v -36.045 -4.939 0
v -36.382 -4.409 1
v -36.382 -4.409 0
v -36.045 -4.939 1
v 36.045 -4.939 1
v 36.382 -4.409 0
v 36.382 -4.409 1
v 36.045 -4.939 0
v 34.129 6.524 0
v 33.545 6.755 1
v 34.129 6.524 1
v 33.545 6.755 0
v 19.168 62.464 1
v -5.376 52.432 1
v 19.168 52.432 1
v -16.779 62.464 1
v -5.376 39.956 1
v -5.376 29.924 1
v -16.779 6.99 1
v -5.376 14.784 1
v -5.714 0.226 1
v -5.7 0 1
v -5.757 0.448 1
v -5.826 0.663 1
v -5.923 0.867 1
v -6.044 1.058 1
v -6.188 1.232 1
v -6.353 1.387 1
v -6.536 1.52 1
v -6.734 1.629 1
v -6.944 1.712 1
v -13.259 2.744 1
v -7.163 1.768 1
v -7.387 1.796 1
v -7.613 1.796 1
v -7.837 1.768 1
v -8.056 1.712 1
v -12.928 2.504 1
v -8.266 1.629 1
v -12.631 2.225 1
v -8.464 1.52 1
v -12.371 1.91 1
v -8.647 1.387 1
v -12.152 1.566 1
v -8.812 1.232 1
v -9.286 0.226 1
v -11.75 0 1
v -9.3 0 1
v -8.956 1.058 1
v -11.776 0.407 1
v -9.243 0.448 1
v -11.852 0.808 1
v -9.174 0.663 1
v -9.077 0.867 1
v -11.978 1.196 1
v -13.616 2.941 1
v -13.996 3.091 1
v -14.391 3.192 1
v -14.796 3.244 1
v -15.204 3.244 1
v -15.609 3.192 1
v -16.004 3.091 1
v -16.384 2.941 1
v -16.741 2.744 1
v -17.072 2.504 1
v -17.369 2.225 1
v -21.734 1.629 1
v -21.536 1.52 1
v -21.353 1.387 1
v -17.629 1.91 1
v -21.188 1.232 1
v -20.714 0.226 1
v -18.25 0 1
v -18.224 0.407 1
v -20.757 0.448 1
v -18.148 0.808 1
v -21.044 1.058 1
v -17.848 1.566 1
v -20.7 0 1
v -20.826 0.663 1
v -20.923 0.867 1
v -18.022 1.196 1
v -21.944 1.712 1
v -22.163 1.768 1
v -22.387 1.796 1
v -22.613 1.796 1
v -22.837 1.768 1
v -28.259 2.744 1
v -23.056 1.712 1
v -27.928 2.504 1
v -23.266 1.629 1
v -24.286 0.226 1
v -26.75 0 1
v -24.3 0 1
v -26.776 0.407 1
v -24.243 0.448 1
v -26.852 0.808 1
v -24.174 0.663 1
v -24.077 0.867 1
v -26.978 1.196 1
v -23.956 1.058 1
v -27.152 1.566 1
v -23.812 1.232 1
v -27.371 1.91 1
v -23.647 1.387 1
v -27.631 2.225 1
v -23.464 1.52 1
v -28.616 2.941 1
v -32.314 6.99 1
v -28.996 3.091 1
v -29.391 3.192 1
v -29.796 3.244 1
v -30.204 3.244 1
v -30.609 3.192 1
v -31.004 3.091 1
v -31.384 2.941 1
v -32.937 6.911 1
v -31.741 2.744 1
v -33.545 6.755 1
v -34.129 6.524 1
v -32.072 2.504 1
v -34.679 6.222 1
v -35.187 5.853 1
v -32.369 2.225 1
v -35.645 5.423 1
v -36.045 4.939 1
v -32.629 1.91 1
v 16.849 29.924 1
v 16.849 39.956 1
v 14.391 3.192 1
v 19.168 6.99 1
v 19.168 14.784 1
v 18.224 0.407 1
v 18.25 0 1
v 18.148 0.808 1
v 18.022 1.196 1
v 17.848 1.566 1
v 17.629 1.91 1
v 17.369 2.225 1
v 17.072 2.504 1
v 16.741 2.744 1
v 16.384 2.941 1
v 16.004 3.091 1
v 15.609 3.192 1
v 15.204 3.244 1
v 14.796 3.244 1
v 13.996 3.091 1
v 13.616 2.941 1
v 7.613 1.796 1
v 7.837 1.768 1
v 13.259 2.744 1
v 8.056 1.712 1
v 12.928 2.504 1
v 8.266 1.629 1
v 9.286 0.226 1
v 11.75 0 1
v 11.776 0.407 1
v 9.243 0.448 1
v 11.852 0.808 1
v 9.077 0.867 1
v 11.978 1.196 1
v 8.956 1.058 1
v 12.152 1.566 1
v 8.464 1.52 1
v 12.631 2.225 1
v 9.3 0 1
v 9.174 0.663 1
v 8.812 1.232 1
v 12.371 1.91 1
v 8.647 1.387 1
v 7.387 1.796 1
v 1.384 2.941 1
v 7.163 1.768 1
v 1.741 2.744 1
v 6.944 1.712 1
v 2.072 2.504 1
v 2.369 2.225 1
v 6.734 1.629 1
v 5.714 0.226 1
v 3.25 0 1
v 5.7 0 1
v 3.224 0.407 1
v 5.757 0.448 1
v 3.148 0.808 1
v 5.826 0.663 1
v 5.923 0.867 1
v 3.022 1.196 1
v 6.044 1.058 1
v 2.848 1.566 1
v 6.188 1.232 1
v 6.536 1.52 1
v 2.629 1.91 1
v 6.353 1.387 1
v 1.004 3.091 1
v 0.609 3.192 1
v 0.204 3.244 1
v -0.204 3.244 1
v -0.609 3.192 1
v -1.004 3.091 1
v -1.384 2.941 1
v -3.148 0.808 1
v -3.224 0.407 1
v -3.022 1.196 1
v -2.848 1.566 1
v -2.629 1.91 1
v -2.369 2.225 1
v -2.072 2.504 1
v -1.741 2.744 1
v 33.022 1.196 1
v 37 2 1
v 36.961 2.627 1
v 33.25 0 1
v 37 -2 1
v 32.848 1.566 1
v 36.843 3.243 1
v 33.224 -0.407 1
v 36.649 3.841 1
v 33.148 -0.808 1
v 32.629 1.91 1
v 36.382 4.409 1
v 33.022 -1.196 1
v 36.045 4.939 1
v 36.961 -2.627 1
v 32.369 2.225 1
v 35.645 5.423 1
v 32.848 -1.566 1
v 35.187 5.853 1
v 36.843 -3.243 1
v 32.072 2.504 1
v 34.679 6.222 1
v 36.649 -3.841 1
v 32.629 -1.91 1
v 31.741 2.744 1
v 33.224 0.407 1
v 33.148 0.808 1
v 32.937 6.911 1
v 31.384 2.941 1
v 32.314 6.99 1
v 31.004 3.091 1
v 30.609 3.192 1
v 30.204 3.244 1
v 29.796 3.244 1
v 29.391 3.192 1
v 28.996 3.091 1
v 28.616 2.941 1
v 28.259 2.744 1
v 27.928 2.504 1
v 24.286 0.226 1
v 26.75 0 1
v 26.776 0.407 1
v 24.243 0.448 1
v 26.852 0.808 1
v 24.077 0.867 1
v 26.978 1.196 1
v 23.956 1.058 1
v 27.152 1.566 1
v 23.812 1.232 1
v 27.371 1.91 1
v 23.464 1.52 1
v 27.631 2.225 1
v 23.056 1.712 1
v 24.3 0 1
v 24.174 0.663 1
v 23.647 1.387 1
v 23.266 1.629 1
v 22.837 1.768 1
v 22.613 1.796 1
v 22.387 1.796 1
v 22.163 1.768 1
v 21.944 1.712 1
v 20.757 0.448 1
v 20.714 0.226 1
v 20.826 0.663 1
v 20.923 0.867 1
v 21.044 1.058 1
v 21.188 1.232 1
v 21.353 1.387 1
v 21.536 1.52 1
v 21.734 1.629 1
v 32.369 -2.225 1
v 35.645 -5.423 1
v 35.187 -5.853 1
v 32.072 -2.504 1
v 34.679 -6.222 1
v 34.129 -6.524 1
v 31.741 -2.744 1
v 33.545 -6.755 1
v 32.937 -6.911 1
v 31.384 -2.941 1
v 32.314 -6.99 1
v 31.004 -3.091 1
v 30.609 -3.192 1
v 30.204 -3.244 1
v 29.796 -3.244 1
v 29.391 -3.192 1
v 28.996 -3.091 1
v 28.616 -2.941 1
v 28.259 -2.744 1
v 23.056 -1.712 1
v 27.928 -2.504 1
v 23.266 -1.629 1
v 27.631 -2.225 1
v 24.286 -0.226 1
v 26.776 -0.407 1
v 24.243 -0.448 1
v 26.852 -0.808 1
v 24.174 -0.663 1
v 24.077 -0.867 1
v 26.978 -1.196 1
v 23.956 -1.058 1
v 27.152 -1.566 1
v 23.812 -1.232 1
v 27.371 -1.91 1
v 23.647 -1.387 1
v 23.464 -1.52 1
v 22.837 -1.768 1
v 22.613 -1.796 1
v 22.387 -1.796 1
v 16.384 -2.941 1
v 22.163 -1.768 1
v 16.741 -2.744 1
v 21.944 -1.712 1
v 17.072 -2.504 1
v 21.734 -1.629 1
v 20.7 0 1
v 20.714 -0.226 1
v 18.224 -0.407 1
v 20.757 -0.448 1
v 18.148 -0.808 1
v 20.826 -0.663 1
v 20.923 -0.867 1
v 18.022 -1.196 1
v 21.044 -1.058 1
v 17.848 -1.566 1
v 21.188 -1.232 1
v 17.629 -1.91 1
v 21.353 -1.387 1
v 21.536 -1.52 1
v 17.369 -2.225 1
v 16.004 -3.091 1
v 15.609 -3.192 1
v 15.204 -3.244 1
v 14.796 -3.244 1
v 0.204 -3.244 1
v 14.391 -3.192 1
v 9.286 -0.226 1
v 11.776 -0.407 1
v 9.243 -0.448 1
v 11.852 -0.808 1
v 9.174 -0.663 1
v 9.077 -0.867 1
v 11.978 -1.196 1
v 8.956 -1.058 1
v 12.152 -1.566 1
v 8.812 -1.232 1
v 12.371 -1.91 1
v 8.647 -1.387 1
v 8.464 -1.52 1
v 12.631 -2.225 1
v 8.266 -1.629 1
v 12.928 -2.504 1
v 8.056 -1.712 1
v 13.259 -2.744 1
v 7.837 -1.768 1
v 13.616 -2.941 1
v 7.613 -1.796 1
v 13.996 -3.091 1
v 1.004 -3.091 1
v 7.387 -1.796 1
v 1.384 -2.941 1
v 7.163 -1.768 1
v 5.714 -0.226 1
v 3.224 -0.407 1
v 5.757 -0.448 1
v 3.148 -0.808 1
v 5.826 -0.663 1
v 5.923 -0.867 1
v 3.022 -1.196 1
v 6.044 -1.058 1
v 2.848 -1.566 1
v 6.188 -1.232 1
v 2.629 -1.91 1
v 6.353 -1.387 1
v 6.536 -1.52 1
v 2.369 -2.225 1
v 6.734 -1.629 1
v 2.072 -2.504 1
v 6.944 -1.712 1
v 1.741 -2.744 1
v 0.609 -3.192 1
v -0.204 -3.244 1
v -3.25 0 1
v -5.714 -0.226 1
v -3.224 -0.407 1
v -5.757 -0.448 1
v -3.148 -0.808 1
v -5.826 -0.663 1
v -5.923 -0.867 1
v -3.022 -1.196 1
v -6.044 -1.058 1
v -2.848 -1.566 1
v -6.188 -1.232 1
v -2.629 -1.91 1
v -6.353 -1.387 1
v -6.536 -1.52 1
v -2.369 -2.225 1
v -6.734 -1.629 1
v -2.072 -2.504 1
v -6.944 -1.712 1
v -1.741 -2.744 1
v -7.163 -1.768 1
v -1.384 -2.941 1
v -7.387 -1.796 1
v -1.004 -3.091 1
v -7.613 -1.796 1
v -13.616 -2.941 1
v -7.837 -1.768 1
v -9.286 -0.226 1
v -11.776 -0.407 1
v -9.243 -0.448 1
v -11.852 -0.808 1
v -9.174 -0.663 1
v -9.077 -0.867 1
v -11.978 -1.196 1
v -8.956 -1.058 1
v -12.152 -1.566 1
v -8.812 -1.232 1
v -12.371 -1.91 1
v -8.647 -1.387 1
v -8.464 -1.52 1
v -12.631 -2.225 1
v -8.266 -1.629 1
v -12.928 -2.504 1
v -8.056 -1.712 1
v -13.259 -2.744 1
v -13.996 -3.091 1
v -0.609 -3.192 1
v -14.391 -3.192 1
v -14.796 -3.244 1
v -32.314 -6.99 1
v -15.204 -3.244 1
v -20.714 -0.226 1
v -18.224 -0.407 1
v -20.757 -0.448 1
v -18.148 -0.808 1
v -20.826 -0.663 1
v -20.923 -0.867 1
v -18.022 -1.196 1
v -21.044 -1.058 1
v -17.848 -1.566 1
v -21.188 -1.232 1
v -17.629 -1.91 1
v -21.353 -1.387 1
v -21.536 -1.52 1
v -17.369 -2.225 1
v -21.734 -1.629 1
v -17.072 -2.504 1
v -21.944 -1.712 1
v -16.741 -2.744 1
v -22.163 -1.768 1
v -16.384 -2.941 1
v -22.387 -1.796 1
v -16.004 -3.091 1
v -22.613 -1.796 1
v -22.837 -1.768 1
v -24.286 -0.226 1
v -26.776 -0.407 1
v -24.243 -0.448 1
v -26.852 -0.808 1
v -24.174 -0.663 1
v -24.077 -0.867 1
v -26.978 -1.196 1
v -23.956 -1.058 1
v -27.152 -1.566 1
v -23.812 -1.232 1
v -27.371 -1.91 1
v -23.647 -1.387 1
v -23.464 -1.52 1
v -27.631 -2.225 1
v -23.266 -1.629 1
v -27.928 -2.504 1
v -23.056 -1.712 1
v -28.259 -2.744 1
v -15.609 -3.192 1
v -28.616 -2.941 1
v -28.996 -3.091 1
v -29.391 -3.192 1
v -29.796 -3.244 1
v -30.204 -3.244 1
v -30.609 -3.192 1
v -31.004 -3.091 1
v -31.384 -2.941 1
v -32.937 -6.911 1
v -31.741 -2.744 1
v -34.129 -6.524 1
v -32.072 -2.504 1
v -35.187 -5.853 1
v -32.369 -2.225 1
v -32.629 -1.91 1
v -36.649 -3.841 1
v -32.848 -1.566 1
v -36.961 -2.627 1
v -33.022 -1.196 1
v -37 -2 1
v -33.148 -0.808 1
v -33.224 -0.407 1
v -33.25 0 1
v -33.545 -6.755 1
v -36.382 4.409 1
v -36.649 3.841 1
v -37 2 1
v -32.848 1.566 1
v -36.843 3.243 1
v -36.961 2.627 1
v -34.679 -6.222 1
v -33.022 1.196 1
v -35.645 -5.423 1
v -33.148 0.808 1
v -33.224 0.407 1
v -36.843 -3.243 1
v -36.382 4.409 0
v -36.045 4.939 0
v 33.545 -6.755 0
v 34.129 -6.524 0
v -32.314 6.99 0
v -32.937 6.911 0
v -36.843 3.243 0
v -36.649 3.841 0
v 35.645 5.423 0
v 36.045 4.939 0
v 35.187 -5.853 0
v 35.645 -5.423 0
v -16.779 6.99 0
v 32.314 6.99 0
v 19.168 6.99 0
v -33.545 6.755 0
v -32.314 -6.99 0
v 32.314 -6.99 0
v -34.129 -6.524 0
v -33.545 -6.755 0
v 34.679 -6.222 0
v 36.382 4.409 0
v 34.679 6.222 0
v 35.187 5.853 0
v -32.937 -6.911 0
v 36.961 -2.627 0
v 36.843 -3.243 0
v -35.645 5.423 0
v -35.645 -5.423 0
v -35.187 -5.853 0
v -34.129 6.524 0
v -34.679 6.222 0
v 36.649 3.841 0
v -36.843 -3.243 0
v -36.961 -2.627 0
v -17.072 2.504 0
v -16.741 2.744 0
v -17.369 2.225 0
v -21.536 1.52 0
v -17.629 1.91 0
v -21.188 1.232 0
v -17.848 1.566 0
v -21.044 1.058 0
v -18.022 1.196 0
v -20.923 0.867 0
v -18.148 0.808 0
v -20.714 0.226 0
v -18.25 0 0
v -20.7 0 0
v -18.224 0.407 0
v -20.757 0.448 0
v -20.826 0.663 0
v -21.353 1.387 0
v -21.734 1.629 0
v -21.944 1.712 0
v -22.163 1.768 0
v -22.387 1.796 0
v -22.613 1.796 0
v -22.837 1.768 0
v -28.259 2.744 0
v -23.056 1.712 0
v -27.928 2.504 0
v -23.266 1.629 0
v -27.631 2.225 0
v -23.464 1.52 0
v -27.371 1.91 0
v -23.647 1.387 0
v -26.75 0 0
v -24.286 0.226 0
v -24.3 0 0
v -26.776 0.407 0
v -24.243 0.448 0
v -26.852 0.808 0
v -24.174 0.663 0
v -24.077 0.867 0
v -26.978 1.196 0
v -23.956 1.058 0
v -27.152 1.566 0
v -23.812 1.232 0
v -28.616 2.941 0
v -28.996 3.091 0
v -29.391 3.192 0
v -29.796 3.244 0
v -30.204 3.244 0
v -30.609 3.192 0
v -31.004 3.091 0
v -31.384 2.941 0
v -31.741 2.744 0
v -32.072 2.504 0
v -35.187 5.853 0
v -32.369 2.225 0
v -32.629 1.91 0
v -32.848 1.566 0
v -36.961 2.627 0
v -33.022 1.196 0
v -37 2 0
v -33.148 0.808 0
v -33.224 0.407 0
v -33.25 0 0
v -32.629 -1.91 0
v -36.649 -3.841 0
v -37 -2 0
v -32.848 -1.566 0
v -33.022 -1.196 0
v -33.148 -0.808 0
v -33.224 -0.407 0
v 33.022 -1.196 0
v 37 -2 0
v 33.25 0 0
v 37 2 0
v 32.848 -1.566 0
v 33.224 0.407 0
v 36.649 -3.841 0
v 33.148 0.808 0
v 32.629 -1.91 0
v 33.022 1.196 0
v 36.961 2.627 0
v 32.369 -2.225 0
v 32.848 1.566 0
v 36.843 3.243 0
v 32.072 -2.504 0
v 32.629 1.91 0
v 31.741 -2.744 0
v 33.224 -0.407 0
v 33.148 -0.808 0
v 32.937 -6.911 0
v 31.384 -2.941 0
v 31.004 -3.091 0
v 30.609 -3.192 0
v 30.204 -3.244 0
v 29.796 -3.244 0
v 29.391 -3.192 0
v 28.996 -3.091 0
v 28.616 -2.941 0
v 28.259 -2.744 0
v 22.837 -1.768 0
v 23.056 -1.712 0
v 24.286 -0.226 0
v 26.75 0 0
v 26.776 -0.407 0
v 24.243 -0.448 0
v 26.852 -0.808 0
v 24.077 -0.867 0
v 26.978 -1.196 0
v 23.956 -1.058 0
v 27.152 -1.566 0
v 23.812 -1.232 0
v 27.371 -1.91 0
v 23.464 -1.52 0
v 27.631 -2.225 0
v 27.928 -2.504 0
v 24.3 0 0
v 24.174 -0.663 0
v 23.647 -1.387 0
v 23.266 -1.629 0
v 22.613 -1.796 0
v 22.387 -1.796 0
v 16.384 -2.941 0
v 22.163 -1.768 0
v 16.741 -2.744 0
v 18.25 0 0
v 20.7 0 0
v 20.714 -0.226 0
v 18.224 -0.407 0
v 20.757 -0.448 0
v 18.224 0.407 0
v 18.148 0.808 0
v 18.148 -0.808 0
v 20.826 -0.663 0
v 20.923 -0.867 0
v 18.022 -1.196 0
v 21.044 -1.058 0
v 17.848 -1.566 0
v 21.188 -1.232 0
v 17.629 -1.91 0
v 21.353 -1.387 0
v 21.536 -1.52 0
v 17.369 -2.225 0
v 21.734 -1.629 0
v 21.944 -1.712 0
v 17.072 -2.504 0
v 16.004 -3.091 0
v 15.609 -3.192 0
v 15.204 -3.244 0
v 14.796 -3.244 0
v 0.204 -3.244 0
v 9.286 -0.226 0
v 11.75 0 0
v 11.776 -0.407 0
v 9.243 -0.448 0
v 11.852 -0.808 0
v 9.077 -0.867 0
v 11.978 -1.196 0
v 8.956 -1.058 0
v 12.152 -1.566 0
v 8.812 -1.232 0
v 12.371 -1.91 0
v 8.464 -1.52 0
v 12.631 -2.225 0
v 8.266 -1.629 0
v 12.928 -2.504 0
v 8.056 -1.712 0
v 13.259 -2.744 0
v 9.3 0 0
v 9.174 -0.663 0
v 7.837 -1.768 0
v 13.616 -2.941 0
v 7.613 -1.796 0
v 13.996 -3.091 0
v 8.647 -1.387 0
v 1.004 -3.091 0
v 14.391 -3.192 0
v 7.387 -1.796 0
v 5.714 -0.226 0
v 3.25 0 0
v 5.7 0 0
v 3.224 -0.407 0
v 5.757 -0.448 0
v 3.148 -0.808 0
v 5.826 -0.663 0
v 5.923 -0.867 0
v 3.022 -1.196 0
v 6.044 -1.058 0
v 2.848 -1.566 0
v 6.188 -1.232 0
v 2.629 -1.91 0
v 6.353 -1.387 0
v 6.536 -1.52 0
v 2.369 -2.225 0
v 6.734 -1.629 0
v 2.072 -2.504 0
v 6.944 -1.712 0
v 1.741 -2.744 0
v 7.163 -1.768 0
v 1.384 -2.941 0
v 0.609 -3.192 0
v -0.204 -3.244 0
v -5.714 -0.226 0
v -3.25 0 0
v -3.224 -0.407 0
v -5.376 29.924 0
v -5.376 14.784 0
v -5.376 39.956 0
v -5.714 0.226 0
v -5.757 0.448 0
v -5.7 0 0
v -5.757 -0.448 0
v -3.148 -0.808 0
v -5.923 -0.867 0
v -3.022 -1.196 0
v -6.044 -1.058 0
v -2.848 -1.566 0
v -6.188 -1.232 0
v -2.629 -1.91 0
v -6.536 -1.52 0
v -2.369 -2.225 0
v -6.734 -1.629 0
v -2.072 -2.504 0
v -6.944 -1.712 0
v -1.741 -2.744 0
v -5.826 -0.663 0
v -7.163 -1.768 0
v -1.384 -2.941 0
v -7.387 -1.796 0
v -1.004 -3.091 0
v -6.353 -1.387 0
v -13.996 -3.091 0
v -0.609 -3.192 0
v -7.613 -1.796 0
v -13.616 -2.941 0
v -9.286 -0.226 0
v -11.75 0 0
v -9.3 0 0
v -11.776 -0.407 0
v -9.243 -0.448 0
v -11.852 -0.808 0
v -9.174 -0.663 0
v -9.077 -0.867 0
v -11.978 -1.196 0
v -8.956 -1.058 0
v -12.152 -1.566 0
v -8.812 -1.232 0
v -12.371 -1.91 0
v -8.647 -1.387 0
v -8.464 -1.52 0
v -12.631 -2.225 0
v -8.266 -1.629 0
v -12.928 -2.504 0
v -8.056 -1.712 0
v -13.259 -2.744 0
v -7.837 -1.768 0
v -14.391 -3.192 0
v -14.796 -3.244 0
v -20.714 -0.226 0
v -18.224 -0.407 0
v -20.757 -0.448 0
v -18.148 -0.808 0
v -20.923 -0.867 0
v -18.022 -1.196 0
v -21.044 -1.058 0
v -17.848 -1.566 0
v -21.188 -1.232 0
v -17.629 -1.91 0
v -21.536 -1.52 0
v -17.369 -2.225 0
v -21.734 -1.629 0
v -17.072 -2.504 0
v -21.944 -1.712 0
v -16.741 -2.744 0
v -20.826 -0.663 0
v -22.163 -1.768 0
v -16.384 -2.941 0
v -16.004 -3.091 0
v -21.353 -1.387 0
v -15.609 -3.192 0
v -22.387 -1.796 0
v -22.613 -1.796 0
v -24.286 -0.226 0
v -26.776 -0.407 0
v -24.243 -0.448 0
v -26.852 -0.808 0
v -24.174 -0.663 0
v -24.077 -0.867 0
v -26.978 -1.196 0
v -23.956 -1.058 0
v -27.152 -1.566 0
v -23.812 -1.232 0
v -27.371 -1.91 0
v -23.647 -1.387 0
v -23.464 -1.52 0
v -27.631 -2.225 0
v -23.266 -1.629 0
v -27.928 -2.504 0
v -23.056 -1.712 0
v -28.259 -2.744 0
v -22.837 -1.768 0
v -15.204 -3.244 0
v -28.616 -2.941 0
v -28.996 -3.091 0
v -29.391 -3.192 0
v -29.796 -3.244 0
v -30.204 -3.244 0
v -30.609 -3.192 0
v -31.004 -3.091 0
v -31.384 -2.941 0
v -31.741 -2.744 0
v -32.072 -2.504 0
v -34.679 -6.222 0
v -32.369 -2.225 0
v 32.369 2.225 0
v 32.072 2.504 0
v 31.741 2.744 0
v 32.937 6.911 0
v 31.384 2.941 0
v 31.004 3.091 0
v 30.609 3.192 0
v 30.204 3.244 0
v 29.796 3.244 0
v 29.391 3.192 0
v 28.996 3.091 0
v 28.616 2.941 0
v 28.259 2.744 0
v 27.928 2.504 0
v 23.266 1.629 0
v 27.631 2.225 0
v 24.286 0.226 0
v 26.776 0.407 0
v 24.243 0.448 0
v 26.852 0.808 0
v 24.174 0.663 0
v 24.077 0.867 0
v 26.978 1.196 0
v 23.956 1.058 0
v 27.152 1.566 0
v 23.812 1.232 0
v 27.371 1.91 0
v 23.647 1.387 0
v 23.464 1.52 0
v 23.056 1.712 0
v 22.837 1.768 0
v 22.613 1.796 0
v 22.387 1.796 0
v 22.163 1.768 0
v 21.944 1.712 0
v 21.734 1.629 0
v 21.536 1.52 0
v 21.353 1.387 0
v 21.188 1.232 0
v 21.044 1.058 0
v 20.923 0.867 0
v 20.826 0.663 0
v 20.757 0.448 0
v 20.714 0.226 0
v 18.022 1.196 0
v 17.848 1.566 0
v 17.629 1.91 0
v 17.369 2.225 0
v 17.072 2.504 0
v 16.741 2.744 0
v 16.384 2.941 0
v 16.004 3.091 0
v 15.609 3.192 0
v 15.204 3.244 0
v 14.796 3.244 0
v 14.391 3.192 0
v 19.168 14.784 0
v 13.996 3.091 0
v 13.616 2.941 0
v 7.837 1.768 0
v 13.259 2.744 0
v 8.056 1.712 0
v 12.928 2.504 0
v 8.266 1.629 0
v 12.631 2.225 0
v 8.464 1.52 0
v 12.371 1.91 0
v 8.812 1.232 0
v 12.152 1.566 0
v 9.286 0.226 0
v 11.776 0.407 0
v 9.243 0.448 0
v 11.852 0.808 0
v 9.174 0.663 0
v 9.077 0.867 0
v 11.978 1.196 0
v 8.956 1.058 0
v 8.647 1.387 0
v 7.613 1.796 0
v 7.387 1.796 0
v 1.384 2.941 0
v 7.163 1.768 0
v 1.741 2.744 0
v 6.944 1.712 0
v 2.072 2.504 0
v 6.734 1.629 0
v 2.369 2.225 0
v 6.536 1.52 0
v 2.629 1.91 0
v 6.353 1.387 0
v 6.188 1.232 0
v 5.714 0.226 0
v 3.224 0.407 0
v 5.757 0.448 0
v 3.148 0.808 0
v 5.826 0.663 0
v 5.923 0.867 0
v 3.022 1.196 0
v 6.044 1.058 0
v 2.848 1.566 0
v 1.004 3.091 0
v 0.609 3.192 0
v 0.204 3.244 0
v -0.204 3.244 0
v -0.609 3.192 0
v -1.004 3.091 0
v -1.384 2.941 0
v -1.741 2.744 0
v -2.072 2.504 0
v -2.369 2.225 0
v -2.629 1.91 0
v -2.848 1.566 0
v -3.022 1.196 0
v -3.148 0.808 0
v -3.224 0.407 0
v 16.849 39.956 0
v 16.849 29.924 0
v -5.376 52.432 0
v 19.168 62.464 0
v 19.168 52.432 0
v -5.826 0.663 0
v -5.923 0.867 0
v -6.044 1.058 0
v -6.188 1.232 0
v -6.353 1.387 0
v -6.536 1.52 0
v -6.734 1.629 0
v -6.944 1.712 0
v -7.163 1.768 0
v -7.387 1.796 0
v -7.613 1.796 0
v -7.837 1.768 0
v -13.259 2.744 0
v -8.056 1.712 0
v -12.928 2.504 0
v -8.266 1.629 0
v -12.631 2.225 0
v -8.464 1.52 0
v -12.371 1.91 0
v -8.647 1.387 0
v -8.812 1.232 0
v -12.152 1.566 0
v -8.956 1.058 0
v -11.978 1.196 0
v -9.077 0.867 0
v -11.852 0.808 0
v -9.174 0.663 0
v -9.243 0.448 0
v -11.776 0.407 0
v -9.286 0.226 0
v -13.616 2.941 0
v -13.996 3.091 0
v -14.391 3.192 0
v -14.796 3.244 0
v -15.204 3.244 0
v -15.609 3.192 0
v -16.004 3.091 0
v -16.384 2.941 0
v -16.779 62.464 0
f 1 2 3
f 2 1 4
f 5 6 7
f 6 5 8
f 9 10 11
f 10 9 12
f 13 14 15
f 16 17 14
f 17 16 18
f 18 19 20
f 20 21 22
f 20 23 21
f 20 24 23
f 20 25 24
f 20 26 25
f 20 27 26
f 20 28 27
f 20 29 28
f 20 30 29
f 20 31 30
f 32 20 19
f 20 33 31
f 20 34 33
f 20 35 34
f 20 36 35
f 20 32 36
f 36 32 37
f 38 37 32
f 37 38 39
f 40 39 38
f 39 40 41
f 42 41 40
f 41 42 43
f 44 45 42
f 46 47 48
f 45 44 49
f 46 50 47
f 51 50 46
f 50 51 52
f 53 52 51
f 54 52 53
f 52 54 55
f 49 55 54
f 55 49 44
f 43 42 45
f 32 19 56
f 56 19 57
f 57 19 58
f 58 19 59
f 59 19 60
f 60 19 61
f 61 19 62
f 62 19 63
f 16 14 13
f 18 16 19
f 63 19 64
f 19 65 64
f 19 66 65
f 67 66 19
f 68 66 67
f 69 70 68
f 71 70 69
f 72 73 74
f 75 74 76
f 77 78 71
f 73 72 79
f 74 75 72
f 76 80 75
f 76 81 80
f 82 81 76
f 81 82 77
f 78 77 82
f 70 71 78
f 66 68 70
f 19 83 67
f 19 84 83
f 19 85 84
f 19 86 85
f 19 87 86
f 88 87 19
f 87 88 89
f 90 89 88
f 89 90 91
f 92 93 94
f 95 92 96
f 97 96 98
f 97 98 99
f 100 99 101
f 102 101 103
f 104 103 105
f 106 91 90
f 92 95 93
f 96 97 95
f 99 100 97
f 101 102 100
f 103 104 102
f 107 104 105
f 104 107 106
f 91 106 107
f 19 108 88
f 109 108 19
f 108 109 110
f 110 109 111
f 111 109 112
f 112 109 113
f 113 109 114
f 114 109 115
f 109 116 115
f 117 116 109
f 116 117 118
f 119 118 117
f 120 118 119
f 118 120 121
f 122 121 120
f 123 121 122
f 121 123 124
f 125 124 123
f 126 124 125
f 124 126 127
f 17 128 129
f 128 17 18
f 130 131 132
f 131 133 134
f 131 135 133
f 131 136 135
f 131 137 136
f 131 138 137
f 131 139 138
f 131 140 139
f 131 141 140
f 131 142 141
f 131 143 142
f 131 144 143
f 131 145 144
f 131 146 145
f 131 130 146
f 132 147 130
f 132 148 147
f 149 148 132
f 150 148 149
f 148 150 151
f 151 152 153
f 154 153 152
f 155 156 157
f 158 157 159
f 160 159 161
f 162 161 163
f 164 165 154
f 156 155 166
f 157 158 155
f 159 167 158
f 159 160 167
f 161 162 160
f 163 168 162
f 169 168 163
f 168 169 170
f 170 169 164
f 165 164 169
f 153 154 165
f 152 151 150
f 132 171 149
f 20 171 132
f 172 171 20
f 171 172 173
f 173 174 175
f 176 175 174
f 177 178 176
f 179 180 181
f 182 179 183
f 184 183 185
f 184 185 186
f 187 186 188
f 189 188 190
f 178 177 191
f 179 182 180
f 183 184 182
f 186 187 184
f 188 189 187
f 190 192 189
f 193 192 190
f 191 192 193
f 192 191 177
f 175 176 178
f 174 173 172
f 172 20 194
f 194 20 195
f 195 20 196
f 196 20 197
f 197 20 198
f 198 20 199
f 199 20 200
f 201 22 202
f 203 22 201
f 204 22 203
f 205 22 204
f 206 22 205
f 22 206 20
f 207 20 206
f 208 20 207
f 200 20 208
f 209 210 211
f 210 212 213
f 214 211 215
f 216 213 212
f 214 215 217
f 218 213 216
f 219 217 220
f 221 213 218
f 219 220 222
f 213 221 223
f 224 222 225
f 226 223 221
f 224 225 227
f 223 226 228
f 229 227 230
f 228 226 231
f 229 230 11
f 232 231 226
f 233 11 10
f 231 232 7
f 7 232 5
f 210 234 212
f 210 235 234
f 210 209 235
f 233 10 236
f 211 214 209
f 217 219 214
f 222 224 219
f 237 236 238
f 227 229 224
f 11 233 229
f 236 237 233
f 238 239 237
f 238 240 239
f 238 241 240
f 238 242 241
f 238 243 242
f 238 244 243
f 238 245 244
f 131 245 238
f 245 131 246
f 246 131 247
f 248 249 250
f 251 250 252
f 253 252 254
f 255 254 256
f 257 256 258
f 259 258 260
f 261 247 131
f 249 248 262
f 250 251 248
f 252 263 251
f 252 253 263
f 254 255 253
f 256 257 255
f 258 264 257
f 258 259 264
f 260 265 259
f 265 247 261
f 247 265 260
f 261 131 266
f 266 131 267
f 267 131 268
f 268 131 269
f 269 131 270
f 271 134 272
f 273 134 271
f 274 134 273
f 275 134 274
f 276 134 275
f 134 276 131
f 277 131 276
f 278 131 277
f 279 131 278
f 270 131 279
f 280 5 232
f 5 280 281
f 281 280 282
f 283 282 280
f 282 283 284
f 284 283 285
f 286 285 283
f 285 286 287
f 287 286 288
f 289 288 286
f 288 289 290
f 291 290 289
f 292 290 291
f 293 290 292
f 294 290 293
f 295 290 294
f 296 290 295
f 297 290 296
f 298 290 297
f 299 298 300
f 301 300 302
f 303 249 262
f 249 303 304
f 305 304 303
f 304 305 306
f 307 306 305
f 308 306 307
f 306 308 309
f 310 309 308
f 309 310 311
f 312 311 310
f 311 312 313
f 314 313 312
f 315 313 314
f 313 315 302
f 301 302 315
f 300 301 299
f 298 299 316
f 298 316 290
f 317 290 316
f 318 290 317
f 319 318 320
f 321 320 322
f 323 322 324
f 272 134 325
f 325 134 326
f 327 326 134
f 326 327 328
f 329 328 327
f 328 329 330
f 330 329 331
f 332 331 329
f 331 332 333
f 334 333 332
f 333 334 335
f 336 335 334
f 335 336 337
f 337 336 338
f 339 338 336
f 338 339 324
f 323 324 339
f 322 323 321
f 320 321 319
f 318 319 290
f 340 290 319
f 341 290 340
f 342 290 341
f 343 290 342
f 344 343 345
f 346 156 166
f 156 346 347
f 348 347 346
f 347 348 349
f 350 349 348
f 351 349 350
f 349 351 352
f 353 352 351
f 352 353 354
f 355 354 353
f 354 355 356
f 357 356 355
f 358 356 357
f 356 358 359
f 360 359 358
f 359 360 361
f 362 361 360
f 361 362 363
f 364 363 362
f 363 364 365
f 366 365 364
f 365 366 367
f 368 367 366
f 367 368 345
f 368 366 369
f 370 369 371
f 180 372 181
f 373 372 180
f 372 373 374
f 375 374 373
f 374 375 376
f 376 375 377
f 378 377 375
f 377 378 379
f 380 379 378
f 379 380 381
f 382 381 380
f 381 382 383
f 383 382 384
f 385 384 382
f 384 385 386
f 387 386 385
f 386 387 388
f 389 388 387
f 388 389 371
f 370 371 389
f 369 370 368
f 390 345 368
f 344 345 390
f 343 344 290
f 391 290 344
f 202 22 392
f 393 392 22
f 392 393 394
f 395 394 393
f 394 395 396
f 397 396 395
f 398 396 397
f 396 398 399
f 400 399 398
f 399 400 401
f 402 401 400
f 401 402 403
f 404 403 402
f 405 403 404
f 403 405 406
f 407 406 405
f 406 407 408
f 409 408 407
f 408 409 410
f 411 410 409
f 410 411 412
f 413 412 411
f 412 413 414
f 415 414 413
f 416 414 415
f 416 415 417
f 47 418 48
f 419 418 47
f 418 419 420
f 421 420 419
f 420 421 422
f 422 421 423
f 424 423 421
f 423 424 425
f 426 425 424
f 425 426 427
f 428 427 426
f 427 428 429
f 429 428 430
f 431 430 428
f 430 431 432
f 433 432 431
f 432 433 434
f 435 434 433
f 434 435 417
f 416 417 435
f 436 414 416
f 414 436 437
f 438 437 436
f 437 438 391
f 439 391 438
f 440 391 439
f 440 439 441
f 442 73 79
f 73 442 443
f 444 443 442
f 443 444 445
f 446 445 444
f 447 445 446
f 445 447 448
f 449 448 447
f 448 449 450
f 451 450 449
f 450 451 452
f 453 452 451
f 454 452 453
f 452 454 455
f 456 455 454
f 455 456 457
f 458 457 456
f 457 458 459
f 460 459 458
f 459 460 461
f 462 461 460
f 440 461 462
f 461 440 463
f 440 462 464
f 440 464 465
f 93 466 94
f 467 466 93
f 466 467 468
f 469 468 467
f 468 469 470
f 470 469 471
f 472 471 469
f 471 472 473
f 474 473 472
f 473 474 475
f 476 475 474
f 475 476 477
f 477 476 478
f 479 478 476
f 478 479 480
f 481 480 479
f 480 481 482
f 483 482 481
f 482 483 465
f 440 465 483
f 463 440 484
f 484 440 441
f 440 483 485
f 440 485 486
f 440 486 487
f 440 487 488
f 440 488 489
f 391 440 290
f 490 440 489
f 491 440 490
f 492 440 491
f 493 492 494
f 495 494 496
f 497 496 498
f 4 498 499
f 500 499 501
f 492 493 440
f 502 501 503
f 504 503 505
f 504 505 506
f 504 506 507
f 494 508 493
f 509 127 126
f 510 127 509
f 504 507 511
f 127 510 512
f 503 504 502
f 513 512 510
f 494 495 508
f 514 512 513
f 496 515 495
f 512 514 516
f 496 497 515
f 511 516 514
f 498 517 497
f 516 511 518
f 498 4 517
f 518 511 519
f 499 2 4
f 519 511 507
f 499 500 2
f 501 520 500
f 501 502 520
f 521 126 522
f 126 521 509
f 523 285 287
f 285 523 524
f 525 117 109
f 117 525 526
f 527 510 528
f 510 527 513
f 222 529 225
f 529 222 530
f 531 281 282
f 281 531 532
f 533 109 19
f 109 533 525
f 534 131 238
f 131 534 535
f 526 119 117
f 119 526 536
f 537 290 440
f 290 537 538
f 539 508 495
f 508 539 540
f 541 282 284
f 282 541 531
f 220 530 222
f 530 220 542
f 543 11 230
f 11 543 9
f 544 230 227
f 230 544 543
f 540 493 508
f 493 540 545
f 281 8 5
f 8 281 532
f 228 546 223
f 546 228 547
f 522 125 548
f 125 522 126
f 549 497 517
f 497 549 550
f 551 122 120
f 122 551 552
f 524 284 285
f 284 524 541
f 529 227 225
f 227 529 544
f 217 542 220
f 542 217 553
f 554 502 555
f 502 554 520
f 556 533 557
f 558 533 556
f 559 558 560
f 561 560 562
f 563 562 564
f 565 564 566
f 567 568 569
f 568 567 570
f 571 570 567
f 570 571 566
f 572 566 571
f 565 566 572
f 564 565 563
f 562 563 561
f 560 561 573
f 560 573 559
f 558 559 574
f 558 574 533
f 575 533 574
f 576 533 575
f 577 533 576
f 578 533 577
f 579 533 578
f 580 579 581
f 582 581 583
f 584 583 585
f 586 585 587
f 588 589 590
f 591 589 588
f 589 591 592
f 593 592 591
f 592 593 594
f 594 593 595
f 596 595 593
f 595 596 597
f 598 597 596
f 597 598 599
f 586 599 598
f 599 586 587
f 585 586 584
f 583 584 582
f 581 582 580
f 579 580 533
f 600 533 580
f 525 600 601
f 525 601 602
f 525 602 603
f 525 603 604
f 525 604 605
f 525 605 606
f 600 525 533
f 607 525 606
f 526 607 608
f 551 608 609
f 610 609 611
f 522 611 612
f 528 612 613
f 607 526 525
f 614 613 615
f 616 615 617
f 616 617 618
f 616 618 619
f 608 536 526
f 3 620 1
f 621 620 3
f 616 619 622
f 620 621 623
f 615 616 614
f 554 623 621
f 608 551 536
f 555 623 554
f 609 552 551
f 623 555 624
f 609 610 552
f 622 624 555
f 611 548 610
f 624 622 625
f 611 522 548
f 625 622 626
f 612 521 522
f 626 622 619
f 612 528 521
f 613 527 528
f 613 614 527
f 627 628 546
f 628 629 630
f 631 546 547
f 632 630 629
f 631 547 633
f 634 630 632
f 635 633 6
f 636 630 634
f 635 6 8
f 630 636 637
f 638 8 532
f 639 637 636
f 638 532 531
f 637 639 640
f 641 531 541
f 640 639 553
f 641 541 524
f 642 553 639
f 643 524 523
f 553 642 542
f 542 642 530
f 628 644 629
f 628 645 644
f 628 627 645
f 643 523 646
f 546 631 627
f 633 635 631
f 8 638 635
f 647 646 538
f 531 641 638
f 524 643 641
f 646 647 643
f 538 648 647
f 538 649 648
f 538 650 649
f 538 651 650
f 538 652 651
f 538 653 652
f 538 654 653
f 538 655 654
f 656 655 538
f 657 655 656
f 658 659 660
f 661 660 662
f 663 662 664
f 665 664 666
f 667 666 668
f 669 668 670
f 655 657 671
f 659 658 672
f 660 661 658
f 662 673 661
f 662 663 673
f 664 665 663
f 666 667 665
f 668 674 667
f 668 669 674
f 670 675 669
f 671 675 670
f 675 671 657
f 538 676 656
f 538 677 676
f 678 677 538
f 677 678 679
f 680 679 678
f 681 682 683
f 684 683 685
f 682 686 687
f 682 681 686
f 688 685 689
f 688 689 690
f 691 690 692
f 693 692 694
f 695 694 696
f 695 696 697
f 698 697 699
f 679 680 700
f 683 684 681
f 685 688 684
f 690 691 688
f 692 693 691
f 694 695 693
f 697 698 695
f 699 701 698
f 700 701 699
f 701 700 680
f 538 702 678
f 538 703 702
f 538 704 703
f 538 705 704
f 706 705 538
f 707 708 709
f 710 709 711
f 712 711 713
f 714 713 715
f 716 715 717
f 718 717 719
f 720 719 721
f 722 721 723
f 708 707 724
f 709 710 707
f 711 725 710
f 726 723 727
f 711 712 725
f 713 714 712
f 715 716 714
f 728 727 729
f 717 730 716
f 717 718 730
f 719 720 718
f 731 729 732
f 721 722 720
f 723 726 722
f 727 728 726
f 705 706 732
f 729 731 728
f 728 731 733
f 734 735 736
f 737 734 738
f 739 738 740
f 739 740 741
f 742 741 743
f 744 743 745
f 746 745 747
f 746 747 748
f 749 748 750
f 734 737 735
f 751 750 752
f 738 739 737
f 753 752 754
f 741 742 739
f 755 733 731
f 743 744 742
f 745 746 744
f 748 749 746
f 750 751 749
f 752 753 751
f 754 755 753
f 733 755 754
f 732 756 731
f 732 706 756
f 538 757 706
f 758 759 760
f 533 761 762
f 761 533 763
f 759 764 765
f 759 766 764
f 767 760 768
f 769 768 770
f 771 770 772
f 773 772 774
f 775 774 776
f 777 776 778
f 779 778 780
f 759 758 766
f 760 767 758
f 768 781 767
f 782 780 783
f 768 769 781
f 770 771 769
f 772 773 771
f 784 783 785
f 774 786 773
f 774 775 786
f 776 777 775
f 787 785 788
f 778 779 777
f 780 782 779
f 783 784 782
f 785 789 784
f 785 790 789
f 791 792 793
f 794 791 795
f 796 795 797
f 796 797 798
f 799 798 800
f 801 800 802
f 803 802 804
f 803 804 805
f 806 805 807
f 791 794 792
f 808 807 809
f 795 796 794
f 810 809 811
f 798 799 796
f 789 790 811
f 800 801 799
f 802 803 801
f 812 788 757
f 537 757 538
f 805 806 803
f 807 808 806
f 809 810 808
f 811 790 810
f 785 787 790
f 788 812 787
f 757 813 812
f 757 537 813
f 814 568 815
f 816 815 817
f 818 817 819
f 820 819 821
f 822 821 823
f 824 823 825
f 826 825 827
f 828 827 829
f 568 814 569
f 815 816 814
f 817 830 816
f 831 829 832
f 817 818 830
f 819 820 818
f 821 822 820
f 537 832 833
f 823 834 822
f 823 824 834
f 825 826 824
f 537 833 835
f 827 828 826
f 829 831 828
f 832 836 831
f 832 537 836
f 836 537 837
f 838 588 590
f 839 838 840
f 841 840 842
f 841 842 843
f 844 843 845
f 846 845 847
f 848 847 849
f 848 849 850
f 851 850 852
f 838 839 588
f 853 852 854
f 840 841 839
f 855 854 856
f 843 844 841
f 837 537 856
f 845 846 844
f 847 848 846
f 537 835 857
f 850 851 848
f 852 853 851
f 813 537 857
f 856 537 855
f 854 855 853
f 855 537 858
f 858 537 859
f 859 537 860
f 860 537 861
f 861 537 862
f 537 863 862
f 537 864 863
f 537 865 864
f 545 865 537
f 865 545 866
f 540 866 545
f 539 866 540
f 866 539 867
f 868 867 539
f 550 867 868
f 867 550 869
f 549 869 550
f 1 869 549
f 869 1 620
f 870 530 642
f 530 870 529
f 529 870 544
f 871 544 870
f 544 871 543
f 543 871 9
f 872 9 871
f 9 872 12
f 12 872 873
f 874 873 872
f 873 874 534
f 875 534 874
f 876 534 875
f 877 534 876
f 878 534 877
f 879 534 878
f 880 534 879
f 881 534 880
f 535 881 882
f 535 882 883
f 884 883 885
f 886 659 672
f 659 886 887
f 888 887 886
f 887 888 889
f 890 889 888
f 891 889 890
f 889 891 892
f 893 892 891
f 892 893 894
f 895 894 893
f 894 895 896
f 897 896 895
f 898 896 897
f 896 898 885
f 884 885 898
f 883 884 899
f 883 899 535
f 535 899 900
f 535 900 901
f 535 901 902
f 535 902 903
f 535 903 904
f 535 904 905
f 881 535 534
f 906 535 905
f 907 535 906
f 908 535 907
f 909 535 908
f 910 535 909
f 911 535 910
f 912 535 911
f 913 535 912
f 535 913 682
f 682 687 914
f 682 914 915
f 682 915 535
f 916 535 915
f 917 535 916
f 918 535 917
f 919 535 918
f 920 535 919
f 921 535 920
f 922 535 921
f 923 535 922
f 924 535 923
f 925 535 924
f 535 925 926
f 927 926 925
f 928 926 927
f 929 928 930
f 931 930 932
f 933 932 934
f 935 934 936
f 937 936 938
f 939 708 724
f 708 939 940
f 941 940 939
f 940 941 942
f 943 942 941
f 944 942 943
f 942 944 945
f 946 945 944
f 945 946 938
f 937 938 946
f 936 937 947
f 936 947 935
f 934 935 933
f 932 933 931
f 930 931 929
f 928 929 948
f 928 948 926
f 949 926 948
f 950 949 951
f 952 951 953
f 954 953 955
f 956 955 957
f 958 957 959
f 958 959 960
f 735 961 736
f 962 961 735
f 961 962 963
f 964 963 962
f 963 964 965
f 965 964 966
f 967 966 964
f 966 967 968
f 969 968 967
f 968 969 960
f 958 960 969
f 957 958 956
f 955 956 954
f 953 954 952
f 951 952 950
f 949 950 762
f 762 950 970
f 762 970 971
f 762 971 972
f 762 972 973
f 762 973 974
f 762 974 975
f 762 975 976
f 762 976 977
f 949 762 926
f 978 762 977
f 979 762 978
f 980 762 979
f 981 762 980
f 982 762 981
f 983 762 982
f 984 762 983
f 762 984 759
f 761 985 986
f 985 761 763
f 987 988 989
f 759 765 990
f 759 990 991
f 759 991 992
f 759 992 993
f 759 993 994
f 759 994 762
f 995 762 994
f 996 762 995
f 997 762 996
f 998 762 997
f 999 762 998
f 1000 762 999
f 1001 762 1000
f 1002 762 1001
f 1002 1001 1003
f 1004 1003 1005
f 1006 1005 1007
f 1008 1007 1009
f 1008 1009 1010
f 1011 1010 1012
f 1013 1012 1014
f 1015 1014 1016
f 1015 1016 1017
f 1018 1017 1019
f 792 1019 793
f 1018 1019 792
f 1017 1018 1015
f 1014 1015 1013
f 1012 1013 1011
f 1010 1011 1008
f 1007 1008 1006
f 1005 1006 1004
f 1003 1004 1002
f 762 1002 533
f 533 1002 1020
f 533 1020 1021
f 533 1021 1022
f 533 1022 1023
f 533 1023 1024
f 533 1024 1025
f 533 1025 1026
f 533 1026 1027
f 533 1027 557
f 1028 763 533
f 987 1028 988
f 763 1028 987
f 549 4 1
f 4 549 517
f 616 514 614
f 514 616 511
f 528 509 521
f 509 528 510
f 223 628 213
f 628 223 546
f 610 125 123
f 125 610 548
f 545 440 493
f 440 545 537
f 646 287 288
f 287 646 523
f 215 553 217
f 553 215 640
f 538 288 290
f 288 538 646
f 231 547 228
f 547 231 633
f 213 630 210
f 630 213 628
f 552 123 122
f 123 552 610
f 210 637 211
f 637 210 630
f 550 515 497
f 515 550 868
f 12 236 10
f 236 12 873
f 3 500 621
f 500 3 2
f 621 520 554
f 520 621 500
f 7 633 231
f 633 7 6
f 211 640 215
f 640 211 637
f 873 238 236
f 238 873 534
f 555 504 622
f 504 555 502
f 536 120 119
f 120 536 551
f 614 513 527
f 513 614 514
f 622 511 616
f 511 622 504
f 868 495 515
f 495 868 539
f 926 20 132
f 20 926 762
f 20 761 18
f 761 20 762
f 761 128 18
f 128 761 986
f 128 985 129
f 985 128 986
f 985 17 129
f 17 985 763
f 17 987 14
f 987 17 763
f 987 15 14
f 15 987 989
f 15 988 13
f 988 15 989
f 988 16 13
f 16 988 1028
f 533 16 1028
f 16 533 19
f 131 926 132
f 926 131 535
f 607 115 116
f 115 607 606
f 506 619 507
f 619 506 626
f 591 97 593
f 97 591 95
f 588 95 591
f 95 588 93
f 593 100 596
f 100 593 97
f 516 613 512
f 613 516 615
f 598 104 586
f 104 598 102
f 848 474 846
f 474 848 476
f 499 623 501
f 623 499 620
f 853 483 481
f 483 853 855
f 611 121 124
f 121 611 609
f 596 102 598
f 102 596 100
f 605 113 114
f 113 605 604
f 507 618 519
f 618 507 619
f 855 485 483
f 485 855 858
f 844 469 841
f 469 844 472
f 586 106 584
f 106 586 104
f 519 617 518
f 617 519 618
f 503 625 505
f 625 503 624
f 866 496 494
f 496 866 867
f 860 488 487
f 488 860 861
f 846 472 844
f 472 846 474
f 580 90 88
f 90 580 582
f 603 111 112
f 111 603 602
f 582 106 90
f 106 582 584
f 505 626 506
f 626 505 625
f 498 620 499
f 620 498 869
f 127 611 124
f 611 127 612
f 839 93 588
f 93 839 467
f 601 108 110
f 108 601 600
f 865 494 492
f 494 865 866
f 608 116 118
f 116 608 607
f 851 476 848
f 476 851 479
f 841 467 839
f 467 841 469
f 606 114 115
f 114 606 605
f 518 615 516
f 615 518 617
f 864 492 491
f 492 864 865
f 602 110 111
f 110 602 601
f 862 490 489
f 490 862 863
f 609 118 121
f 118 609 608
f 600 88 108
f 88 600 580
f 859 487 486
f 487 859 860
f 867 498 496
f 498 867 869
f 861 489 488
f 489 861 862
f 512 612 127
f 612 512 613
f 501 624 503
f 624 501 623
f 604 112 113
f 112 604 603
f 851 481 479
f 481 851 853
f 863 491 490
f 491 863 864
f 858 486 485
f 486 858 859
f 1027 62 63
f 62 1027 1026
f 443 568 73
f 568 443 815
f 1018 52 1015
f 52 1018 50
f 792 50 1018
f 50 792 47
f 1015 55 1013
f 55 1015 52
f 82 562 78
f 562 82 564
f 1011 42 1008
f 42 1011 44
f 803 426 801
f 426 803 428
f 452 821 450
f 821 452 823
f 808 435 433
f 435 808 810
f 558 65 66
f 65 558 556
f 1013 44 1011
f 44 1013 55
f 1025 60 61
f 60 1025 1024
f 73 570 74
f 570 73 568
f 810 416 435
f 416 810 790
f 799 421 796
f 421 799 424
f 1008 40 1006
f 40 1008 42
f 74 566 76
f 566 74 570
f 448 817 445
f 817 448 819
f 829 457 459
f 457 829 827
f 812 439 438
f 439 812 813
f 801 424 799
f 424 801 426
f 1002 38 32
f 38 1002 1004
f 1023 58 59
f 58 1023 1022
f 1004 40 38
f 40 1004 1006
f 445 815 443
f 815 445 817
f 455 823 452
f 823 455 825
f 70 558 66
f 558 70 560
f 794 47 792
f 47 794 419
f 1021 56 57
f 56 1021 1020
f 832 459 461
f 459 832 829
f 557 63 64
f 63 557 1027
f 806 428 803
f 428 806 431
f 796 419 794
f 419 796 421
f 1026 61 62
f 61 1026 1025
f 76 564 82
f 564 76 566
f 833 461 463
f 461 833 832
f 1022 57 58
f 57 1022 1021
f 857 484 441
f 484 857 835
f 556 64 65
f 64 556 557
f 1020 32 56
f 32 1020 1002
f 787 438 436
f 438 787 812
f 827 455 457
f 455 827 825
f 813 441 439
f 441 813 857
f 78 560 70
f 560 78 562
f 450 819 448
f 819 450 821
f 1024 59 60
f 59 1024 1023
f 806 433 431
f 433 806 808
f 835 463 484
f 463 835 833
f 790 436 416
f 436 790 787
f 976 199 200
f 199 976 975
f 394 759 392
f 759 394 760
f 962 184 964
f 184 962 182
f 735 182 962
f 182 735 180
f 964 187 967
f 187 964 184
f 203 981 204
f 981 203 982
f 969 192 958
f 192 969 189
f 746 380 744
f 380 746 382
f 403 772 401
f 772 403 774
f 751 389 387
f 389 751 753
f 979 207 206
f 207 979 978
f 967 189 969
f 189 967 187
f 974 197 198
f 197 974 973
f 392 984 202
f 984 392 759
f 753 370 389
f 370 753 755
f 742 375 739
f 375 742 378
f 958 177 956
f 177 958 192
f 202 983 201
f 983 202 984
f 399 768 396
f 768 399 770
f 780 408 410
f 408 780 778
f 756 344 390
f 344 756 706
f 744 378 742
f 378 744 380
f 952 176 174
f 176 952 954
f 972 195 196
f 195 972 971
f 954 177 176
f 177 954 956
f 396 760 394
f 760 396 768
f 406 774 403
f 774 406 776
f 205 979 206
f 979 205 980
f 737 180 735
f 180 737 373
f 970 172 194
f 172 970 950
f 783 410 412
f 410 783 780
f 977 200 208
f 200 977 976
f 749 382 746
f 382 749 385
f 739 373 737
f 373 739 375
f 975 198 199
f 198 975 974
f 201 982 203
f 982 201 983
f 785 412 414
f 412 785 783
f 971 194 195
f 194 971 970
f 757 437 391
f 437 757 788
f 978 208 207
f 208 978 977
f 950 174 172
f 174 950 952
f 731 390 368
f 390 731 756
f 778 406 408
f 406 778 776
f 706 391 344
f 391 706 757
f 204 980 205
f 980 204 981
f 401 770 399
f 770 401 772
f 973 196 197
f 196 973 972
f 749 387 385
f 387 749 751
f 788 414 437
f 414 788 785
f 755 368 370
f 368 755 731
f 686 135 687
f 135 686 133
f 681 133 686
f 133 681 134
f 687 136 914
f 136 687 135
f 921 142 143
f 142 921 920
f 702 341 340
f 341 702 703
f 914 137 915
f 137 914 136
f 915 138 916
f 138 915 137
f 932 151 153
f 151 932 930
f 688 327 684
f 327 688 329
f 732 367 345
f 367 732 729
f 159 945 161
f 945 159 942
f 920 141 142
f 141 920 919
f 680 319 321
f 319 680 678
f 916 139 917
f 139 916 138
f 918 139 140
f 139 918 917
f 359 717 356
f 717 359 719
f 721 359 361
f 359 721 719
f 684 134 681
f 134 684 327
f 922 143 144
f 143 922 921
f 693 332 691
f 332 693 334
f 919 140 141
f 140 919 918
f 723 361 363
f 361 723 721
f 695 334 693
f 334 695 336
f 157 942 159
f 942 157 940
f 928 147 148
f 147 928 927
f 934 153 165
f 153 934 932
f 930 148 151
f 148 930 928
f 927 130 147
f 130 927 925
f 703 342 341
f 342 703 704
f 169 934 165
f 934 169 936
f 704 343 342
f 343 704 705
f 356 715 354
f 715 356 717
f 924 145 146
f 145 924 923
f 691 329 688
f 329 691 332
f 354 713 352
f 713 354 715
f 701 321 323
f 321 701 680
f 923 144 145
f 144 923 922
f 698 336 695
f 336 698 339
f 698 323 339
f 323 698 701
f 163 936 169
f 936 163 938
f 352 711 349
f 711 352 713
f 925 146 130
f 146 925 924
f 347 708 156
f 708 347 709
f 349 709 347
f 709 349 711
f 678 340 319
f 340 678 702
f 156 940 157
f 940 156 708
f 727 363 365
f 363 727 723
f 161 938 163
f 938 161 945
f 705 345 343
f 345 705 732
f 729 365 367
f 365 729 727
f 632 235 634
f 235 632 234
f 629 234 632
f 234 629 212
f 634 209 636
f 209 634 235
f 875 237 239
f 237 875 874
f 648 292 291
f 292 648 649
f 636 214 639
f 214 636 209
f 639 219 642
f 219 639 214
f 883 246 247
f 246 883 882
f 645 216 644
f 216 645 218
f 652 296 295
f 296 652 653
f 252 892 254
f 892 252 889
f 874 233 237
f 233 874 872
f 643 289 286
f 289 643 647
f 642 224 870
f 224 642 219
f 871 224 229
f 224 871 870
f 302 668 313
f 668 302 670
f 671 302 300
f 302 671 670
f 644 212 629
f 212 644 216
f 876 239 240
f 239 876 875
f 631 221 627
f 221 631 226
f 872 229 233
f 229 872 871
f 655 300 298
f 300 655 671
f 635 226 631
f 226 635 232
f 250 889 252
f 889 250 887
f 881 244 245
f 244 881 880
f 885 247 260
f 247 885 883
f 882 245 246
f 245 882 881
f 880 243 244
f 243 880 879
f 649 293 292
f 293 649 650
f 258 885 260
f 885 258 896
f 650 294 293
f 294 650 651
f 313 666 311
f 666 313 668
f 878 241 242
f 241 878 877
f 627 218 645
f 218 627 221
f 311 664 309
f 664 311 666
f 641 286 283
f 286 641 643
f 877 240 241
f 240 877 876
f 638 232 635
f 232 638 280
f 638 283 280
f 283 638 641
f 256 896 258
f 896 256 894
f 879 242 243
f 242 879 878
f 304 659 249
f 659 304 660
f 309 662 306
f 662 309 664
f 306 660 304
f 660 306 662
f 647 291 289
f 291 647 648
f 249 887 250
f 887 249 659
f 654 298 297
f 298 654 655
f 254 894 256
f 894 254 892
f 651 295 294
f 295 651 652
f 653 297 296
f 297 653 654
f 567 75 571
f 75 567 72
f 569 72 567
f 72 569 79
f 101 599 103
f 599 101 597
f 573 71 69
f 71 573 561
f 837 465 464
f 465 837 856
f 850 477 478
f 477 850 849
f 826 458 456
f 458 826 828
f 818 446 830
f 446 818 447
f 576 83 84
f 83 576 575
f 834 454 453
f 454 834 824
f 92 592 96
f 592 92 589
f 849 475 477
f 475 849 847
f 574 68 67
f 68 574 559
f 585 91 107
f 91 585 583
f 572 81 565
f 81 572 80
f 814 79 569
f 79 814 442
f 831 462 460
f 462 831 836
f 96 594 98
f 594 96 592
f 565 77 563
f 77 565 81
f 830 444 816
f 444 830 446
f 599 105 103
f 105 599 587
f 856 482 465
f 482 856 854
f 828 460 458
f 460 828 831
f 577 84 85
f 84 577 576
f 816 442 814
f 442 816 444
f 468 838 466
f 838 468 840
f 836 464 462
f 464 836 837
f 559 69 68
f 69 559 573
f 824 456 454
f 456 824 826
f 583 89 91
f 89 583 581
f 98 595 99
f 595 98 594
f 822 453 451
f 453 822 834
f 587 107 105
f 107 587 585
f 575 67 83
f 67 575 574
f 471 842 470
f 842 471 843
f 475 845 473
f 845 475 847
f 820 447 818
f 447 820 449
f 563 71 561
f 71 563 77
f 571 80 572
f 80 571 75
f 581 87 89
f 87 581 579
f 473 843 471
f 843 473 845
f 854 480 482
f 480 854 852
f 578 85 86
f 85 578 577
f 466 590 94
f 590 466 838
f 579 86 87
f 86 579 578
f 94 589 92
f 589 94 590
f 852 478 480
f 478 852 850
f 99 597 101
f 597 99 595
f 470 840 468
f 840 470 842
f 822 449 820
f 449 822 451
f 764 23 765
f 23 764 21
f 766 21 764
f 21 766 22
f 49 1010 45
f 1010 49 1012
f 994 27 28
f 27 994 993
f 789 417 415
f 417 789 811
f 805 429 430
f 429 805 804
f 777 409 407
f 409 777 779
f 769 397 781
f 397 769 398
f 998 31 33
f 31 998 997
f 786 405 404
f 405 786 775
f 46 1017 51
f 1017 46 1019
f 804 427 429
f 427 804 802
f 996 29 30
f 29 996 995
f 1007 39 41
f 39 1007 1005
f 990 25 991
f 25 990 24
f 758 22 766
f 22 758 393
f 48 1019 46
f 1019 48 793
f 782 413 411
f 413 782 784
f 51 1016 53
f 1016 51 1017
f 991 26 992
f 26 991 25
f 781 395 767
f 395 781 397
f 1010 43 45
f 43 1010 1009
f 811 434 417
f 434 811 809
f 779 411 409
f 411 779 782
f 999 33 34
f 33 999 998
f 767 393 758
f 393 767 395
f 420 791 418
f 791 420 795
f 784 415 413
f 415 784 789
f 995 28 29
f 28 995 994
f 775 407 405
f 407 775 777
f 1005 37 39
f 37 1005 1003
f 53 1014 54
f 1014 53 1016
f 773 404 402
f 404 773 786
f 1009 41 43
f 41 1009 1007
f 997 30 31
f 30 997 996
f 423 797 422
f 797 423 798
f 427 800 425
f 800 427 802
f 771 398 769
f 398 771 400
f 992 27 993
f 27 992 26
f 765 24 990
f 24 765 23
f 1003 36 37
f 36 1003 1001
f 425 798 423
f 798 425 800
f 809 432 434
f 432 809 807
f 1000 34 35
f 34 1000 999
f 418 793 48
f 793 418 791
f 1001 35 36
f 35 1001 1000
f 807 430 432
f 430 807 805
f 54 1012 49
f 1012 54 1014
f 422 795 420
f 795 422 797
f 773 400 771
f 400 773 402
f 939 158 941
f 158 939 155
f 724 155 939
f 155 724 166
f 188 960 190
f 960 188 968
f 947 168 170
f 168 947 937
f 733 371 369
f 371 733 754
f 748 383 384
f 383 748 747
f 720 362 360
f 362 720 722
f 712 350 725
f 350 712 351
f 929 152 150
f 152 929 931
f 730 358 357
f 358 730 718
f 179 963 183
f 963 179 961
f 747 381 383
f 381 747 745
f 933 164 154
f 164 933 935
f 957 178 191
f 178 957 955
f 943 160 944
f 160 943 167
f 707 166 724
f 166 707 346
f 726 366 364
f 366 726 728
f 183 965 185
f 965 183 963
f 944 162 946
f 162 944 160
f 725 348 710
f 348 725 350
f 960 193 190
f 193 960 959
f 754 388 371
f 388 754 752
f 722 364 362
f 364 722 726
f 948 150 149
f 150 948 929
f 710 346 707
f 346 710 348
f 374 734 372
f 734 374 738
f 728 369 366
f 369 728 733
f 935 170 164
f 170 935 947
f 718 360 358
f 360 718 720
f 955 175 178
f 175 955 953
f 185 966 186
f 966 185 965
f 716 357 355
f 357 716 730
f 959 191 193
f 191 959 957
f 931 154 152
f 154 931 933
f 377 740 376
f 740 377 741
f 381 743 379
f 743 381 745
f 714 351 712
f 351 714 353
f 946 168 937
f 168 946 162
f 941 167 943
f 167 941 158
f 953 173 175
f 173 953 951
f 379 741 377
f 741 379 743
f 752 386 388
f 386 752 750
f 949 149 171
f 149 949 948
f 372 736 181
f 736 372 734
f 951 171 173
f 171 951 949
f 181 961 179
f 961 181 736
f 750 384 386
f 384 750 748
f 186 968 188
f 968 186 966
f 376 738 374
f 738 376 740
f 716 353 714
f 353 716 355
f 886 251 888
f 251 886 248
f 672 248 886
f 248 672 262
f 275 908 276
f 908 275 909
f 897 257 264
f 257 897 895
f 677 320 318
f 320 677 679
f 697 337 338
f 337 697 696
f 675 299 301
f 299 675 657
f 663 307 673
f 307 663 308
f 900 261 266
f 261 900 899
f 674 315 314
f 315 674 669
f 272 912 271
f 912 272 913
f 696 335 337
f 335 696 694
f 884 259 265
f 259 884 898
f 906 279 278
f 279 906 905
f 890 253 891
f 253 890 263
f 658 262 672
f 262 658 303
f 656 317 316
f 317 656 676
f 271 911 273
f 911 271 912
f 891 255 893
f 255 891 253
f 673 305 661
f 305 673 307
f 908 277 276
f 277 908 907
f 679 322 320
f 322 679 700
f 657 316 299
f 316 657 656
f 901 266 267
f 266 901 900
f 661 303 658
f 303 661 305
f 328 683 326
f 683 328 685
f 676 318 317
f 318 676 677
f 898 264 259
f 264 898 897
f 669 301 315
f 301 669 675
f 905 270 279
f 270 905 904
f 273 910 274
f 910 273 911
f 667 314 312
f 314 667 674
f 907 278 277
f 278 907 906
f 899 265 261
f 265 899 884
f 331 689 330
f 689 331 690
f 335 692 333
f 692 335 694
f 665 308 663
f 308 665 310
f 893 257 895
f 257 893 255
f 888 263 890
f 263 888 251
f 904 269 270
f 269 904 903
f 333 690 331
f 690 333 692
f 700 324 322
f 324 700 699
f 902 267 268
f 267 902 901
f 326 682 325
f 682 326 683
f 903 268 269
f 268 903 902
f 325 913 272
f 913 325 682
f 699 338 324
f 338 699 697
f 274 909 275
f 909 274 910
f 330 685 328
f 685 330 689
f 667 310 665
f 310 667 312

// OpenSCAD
$fn = 50;


difference() {
	union() {
		hull() {
			translate(v = [-32.0000000000, 2.0000000000, 0]) {
				cylinder(h = 1, r = 5);
			}
			translate(v = [32.0000000000, 2.0000000000, 0]) {
				cylinder(h = 1, r = 5);
			}
			translate(v = [-32.0000000000, -2.0000000000, 0]) {
				cylinder(h = 1, r = 5);
			}
			translate(v = [32.0000000000, -2.0000000000, 0]) {
				cylinder(h = 1, r = 5);
			}
		}
		translate(v = [0, 61.1111111111, 0]) {
			linear_extrude(height = 1) {
				text(font = "DejaVu Sans Mono:style=Bold", halign = "center", size = 57.0000000000, text = "E", valign = "top");
			}
		}
	}
	union() {
		translate(v = [-30.0000000000, 0.0000000000, 0]) {
			translate(v = [0, 0, -100]) {
				cylinder(h = 200, r = 3.2500000000);
			}
		}
		translate(v = [-15.0000000000, 0.0000000000, 0]) {
			translate(v = [0, 0, -100]) {
				cylinder(h = 200, r = 3.2500000000);
			}
		}
		translate(v = [0, 0, -100]) {
			cylinder(h = 200, r = 3.2500000000);
		}
		translate(v = [15.0000000000, 0.0000000000, 0]) {
			translate(v = [0, 0, -100]) {
				cylinder(h = 200, r = 3.2500000000);
			}
		}
		translate(v = [30.0000000000, 0.0000000000, 0]) {
			translate(v = [0, 0, -100]) {
				cylinder(h = 200, r = 3.2500000000);
			}
		}
		translate(v = [-30.0000000000, 0.0000000000, 0]) {
			translate(v = [0, 0, -100]) {
				cylinder(h = 200, r = 1.8000000000);
			}
		}
		translate(v = [-22.5000000000, 0.0000000000, 0]) {
			translate(v = [0, 0, -100]) {
				cylinder(h = 200, r = 1.8000000000);
			}
		}
		translate(v = [-15.0000000000, 0.0000000000, 0]) {
			translate(v = [0, 0, -100]) {
				cylinder(h = 200, r = 1.8000000000);
			}
		}
		translate(v = [-7.5000000000, 0.0000000000, 0]) {
			translate(v = [0, 0, -100]) {
				cylinder(h = 200, r = 1.8000000000);
			}
		}
		translate(v = [0, 0, -100]) {
			cylinder(h = 200, r = 1.8000000000);
		}
		translate(v = [7.5000000000, 0.0000000000, 0]) {
			translate(v = [0, 0, -100]) {
				cylinder(h = 200, r = 1.8000000000);
			}
		}
		translate(v = [15.0000000000, 0.0000000000, 0]) {
			translate(v = [0, 0, -100]) {
				cylinder(h = 200, r = 1.8000000000);
			}
		}
		translate(v = [22.5000000000, 0.0000000000, 0]) {
			translate(v = [0, 0, -100]) {
				cylinder(h = 200, r = 1.8000000000);
			}
		}
		translate(v = [30.0000000000, 0.0000000000, 0]) {
			translate(v = [0, 0, -100]) {
				cylinder(h = 200, r = 1.8000000000);
			}
		}
	}
}
